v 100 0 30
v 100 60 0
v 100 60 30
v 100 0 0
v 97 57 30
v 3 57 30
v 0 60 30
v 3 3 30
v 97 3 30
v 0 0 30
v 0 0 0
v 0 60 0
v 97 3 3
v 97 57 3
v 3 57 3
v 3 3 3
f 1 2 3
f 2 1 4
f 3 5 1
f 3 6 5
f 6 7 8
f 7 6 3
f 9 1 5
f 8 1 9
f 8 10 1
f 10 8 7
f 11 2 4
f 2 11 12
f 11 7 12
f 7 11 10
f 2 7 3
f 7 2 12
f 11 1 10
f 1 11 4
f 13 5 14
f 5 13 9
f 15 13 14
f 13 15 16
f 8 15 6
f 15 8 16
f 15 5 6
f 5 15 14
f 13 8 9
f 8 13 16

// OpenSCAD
// Parametric enclosure template for Fabricator line
module enclosure(length=100, width=60, height=30, wall=3) {
    difference() {
        cube([length, width, height], center=false);
        translate([wall, wall, wall]) cube([length-2*wall, width-2*wall, height-wall]);
    }
}

enclosure();
